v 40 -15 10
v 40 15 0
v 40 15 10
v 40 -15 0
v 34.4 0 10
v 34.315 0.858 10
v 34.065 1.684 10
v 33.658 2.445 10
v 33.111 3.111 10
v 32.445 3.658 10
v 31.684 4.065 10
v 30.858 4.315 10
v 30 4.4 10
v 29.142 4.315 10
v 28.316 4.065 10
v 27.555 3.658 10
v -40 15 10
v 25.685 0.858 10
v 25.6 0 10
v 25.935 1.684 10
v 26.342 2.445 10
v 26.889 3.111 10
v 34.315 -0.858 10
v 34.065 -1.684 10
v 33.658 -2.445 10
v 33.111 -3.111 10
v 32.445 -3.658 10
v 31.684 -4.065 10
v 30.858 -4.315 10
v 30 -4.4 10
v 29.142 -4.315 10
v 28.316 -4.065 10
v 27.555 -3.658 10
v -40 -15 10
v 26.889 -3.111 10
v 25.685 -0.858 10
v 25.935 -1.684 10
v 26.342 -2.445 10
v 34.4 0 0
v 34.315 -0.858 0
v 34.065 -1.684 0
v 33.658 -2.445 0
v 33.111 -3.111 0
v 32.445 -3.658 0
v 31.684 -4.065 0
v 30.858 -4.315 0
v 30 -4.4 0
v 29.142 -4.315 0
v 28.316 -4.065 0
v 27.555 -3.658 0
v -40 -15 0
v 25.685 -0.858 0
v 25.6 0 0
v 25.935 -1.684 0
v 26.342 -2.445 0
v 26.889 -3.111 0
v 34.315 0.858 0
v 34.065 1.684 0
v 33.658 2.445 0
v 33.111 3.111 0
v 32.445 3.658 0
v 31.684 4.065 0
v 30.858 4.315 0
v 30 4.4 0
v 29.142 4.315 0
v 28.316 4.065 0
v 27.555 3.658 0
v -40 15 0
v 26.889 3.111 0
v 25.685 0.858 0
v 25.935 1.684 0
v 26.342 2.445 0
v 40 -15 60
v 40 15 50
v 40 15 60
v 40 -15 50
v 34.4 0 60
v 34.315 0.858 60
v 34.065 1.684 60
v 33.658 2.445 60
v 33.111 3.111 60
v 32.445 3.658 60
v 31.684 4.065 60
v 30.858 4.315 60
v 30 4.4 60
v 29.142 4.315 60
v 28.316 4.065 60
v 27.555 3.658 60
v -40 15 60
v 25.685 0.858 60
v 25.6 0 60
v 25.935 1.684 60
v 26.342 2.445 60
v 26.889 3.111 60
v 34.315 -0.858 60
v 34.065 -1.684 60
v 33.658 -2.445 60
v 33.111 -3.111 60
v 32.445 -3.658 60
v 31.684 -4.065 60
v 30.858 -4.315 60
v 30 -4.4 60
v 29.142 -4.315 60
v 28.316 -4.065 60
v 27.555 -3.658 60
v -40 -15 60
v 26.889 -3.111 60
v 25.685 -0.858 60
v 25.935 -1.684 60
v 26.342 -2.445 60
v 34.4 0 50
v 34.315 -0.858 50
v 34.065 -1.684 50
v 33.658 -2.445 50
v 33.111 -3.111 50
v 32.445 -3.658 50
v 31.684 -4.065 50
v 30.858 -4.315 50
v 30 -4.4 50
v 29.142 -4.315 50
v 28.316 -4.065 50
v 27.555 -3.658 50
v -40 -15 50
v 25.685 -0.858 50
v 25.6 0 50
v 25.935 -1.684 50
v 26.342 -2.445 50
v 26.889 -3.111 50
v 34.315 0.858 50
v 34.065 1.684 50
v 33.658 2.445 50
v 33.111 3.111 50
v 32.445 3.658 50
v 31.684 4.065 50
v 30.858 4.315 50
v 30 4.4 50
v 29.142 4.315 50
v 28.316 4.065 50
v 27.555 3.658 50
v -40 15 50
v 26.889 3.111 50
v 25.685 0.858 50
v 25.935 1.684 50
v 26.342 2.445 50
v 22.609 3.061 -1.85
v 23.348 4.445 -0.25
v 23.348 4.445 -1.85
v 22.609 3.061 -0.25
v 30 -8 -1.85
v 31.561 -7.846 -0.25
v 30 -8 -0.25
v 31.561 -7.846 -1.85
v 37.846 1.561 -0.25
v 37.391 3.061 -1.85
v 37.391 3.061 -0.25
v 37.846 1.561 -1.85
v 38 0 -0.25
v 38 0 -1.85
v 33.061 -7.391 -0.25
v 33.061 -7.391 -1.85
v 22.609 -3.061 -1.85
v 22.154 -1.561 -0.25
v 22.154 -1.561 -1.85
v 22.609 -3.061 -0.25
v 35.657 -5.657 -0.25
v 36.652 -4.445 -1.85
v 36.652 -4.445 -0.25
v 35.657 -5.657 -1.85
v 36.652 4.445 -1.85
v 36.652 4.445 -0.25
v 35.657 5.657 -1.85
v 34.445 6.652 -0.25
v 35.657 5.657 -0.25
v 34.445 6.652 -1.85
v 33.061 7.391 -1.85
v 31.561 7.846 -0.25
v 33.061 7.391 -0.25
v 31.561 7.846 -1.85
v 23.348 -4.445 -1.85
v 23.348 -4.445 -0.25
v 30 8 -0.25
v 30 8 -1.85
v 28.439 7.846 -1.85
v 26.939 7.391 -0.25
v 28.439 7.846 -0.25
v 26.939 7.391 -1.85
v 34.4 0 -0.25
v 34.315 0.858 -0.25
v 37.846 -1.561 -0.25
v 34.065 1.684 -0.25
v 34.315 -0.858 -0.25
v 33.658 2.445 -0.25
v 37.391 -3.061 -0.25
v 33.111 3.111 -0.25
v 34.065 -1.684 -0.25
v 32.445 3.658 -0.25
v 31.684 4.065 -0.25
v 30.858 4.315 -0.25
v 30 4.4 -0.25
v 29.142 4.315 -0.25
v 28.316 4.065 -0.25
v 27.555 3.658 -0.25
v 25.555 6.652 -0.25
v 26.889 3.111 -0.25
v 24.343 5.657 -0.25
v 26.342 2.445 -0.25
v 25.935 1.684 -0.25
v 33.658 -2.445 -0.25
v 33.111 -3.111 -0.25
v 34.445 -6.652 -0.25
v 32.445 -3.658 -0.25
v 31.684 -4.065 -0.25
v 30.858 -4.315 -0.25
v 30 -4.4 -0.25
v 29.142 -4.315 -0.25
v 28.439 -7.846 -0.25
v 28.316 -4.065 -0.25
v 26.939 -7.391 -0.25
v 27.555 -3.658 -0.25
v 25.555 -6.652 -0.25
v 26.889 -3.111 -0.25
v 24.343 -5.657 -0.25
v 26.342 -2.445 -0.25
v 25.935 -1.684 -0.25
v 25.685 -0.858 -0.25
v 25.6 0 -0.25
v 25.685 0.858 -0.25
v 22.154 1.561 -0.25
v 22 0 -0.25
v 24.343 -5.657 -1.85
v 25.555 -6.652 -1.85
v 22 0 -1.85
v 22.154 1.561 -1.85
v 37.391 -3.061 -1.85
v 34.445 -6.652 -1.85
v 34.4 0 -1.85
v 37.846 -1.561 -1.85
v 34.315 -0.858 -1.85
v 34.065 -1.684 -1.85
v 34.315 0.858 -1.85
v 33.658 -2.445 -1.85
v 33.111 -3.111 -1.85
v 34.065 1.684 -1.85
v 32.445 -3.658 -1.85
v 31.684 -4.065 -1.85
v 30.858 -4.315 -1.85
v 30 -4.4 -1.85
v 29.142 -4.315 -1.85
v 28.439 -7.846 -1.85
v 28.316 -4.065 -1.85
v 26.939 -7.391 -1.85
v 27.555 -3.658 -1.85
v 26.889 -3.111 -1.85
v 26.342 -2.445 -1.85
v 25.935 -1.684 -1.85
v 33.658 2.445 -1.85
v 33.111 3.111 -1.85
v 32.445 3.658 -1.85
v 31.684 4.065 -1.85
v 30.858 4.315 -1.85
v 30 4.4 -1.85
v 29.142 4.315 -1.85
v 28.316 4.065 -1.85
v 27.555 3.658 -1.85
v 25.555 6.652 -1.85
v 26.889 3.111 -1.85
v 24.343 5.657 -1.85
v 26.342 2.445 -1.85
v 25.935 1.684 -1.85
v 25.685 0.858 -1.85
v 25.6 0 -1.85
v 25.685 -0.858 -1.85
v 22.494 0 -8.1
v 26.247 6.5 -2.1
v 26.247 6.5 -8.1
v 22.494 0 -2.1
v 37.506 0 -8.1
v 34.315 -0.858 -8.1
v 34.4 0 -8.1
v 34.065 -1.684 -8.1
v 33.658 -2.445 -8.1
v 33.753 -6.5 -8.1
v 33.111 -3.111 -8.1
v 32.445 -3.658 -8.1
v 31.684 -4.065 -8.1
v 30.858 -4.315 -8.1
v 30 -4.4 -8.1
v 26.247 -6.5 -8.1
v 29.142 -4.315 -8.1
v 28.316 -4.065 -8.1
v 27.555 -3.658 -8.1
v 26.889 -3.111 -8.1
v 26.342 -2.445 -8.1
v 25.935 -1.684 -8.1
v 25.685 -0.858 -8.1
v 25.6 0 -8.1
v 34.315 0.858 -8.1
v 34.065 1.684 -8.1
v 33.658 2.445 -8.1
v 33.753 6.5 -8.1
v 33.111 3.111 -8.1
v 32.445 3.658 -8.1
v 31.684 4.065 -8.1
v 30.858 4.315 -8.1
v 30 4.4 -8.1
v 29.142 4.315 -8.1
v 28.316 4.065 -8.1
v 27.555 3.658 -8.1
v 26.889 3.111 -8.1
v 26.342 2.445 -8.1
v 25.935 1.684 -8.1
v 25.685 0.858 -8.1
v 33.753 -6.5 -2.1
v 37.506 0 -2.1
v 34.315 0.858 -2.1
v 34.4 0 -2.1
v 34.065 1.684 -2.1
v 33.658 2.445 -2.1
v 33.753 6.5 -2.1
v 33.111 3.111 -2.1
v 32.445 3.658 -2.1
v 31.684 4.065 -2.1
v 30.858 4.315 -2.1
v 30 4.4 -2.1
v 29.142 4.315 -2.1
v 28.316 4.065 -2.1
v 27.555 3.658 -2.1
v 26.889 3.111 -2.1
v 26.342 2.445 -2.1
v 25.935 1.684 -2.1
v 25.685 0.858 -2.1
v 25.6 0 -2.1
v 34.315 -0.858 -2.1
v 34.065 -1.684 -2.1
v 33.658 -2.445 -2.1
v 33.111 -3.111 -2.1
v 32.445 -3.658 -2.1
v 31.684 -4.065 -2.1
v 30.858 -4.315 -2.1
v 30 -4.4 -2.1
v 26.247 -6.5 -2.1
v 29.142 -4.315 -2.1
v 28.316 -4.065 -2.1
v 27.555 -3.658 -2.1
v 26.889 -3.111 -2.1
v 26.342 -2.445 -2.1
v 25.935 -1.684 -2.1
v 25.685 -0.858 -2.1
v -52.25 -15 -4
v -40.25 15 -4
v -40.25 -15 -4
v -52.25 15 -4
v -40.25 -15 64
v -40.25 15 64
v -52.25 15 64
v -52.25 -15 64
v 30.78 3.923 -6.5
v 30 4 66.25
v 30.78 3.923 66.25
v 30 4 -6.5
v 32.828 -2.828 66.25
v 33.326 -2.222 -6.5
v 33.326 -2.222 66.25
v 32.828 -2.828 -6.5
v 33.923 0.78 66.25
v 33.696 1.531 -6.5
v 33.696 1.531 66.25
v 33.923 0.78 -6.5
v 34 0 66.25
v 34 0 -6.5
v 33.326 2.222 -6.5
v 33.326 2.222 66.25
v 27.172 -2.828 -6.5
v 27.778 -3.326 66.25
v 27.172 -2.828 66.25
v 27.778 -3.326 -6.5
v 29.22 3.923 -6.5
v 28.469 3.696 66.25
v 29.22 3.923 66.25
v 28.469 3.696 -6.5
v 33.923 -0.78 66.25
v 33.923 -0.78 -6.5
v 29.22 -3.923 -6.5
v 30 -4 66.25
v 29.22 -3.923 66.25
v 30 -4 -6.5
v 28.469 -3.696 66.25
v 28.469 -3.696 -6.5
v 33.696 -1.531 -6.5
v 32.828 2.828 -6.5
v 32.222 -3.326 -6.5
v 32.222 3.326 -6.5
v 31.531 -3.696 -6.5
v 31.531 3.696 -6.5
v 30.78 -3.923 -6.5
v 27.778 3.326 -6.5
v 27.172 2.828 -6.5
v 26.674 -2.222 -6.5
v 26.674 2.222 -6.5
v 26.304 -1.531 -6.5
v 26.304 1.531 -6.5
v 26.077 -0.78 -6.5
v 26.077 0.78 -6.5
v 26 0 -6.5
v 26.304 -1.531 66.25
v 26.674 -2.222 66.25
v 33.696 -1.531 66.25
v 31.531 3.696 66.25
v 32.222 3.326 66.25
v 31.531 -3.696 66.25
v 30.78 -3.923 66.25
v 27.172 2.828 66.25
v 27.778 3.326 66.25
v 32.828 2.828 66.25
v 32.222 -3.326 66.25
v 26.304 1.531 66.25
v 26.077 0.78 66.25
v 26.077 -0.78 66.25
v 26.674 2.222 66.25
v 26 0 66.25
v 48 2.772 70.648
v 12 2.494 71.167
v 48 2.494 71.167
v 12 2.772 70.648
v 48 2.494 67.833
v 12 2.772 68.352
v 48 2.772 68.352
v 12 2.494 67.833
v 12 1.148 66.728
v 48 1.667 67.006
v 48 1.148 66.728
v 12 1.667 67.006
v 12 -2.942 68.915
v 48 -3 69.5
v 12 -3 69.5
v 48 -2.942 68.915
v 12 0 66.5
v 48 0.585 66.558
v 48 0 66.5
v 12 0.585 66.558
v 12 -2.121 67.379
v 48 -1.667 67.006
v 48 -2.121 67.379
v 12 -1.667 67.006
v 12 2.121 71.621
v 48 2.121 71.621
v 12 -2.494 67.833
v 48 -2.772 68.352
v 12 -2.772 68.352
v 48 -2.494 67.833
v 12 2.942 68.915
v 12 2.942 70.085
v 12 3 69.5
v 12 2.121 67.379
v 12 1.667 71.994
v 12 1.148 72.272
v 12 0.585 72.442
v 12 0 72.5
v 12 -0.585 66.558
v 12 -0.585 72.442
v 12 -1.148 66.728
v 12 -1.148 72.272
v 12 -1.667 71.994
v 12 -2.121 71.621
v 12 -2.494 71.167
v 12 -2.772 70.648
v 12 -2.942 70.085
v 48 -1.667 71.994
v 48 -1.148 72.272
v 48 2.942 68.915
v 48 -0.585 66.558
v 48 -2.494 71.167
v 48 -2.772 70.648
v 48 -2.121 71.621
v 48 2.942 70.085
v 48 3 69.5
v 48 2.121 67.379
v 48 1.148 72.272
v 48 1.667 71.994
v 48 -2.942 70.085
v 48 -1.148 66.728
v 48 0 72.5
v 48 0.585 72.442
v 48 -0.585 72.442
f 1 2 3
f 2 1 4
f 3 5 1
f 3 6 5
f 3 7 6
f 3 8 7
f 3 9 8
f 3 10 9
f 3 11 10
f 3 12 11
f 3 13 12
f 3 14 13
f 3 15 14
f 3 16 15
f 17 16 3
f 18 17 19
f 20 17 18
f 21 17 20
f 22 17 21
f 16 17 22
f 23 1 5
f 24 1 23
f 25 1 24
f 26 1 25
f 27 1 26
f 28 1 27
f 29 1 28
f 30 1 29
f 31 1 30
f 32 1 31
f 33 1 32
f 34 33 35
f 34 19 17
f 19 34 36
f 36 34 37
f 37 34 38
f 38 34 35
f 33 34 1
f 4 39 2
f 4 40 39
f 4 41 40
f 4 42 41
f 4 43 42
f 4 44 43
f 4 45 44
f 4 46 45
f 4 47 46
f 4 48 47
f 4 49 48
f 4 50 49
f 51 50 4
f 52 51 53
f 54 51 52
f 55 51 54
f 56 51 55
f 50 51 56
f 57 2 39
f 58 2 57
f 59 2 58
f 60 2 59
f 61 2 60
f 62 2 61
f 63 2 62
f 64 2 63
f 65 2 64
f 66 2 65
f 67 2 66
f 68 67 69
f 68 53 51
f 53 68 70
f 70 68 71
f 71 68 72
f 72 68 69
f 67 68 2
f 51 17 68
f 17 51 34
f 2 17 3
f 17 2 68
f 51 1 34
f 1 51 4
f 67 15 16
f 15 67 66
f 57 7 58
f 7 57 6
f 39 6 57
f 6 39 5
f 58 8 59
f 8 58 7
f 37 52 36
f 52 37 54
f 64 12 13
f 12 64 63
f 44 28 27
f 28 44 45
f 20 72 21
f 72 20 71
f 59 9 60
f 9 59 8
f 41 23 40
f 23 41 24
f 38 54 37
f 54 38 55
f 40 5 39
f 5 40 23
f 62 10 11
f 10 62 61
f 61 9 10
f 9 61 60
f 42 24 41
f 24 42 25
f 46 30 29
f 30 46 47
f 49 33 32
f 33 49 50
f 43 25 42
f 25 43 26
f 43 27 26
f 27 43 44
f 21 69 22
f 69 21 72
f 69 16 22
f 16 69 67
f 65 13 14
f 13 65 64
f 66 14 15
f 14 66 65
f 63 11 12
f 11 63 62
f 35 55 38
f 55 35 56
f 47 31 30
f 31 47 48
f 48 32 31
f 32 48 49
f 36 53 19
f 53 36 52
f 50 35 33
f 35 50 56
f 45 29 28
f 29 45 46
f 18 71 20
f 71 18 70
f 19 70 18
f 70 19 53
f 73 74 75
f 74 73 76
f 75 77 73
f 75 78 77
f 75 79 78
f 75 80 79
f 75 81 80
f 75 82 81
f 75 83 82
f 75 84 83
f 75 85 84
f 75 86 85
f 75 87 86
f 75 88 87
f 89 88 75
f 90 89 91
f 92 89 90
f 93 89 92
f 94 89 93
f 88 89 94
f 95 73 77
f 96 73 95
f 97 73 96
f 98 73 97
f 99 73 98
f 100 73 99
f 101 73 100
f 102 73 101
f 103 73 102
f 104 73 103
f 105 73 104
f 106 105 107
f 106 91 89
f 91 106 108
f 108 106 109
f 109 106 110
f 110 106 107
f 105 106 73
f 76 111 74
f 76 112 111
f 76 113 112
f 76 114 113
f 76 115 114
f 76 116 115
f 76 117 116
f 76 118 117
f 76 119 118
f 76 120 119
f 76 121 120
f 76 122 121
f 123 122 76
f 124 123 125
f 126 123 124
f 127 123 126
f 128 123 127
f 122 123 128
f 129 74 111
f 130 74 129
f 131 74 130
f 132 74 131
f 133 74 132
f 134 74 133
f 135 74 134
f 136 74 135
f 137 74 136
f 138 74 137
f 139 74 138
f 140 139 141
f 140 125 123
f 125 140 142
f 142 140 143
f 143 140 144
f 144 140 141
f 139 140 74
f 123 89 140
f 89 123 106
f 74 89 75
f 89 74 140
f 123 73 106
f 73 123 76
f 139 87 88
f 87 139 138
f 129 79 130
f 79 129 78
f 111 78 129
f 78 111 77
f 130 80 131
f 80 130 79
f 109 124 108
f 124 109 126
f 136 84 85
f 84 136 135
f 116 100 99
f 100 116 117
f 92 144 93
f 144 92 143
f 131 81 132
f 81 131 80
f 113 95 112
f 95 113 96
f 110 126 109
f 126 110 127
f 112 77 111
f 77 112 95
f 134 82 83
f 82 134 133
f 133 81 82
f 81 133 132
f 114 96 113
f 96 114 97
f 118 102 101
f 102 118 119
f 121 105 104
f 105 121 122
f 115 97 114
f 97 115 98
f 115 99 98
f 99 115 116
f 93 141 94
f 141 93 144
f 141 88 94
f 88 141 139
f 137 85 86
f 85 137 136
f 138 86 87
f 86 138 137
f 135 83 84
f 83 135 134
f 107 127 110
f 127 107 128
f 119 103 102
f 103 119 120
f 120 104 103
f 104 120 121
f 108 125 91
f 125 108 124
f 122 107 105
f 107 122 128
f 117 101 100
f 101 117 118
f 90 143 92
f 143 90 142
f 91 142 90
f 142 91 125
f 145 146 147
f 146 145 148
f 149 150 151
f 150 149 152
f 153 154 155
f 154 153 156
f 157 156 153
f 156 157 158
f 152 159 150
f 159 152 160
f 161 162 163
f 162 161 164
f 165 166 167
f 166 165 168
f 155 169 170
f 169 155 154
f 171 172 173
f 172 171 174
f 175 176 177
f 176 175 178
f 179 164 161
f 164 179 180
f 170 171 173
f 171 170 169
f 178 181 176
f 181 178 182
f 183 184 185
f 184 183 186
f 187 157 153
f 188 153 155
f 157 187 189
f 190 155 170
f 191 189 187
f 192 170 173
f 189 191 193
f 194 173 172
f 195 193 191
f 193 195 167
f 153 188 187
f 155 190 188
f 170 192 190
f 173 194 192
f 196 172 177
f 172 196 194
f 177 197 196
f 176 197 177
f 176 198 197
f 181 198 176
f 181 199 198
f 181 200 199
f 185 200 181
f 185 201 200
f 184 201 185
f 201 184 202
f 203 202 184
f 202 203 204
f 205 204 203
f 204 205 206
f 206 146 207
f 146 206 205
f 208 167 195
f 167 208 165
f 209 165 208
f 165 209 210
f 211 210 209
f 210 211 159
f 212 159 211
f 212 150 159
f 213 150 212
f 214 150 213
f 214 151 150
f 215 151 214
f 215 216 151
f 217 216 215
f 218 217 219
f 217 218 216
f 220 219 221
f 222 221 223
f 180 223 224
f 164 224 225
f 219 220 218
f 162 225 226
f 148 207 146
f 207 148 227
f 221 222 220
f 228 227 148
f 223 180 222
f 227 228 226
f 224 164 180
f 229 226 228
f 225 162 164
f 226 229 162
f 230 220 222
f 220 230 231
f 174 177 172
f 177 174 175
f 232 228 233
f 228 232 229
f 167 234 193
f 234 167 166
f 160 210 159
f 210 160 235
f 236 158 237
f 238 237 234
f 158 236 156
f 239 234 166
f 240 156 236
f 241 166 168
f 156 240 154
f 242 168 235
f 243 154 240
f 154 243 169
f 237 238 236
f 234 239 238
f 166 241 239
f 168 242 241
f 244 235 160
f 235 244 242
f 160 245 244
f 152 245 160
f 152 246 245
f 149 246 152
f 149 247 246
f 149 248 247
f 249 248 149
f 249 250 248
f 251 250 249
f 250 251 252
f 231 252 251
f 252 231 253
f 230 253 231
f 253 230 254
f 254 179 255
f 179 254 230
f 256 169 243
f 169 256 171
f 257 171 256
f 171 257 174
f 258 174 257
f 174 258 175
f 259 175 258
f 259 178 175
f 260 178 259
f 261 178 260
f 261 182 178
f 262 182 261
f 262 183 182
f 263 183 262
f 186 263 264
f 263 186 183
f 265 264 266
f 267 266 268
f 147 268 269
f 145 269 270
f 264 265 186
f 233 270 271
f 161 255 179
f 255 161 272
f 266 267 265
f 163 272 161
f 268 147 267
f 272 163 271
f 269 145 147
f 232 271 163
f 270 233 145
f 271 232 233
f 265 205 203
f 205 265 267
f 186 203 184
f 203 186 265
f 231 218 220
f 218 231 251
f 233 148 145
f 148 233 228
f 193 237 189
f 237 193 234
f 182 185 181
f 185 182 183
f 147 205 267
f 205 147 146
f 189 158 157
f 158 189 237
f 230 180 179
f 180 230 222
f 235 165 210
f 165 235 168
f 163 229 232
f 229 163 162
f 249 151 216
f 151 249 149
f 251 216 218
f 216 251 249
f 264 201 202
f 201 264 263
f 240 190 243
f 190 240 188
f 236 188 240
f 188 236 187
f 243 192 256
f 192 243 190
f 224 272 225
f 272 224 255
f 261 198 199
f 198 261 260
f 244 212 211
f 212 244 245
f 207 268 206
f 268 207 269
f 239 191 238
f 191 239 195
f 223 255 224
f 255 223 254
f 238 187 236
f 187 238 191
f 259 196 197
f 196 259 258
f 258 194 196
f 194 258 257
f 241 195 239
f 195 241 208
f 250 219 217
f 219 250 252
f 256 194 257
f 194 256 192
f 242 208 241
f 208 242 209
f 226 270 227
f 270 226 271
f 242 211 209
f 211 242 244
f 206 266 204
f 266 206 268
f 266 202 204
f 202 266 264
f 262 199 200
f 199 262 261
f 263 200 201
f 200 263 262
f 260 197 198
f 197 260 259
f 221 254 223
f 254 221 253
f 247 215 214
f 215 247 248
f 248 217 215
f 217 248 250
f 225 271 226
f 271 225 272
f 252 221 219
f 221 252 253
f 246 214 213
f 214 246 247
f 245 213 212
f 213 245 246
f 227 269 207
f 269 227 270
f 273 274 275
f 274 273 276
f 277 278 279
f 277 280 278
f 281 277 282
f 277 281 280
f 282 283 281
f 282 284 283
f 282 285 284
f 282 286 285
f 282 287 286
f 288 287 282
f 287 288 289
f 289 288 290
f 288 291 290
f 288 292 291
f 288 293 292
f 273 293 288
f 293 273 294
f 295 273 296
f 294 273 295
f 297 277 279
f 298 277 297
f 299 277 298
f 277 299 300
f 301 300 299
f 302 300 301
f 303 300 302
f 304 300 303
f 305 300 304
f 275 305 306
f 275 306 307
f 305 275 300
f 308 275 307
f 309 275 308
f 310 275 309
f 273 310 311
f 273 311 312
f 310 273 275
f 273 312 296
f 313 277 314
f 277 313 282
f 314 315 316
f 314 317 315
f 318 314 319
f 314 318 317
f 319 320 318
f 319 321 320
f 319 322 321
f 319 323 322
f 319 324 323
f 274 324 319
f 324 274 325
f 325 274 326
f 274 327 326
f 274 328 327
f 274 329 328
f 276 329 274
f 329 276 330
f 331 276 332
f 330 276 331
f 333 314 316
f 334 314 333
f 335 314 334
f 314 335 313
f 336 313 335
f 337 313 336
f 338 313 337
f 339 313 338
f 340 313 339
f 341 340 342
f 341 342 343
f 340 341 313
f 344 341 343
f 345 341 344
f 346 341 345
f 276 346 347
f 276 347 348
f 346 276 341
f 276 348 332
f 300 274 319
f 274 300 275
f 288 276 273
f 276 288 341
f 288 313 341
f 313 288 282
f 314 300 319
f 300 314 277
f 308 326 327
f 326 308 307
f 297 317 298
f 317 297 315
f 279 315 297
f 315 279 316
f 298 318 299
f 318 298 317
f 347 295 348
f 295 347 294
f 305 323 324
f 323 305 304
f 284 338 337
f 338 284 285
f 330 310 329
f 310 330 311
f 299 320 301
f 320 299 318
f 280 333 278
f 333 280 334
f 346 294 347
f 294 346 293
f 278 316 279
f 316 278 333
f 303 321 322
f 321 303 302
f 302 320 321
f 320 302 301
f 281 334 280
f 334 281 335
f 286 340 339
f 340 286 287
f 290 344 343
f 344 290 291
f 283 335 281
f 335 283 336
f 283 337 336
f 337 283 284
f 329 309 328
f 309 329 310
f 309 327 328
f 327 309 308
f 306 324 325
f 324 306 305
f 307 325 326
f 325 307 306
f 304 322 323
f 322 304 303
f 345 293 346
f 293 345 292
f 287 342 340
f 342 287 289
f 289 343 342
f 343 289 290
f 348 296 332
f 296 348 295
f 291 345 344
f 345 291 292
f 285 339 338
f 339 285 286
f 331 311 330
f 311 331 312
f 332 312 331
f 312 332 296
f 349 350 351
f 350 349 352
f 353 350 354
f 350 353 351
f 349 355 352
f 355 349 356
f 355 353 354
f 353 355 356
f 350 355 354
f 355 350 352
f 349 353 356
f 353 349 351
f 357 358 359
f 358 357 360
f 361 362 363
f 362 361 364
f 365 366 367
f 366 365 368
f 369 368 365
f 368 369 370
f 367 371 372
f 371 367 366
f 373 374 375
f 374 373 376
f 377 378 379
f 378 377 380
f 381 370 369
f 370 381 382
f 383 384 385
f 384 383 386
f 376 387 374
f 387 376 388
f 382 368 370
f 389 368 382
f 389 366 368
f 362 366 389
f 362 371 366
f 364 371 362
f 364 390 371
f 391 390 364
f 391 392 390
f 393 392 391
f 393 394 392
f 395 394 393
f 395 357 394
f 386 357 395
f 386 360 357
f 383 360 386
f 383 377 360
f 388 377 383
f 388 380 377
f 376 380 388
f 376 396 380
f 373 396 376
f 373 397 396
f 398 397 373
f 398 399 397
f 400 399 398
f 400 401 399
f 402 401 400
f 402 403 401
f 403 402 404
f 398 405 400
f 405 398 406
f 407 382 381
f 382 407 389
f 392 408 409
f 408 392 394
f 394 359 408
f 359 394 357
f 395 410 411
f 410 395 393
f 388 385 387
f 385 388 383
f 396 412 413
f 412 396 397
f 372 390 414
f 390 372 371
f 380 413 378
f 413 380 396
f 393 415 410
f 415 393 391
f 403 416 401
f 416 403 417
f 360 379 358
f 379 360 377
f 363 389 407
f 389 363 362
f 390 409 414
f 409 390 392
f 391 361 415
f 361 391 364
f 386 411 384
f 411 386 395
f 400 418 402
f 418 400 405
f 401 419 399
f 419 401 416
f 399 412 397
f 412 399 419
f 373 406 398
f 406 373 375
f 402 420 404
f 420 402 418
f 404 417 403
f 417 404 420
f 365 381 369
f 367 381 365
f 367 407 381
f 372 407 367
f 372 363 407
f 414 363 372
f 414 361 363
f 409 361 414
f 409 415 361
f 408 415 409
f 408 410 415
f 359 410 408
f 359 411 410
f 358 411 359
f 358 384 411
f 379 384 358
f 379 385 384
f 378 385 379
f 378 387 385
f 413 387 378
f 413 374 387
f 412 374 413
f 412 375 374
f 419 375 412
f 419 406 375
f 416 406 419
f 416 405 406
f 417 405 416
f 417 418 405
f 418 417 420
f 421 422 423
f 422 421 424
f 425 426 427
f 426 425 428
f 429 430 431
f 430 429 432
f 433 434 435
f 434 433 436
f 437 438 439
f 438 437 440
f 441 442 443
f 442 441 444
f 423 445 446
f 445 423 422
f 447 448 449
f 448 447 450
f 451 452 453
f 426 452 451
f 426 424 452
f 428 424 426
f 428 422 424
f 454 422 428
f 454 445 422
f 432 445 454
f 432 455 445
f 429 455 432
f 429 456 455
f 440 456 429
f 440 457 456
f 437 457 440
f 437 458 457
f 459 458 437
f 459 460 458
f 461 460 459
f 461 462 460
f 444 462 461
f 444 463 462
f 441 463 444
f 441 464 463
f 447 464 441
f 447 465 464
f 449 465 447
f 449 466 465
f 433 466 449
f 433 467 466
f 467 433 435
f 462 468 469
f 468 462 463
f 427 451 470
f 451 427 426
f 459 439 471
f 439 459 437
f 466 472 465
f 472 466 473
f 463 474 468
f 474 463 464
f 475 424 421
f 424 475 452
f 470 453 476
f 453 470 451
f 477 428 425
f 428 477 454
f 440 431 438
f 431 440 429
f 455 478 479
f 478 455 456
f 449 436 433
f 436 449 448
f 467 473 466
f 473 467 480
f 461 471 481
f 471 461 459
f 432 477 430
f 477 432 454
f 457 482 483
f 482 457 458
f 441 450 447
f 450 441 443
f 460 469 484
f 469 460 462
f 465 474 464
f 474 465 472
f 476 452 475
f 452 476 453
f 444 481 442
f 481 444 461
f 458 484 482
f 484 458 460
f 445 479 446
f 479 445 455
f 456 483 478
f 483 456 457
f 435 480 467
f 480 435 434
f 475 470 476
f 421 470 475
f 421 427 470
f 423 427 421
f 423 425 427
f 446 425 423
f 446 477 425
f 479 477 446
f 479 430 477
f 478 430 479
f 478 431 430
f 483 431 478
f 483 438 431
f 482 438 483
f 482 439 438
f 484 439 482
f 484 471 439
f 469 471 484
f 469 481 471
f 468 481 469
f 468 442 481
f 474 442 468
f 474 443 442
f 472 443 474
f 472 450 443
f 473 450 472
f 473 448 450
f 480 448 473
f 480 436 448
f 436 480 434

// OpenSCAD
$fn = 32;

// ------------------------------------------------------------------------
// C clamp: throat 50 mm, screw d8
// Every part is its own module, assembly() places every instance.
// ------------------------------------------------------------------------

// --- part 1 ---
module clamp_arm() {
  difference() {
    translate([-40, -15, 0]) cube([80, 30, 10]);
    translate([30, 0, -1]) cylinder(h = 12, d = 8.8);
  }
}

// --- part 2 ---
module clamp_spine() {
  difference() {
    translate([-34, -15, 0]) cube([68, 30, 12]);
  }
}

// --- part 3 ---
module clamp_screw() {
  translate([0, 0, -36.375]) cylinder(h = 72.75, d = 8);
}

// --- part 4 ---
module clamp_washer() {
  difference() {
      translate([0, 0, 0]) cylinder(h = 1.6, d = 16);
      translate([0, 0, -1]) cylinder(h = 3.6, d = 8.8);
    }
}

// --- part 5 ---
module clamp_nut() {
  difference() {
    linear_extrude(height = 6) polygon(points = [[7.506, 0], [3.753, 6.5], [-3.753, 6.5], [-7.506, 0], [-3.753, -6.5], [3.753, -6.5]]);
    translate([0, 0, -1]) cylinder(h = 8, d = 8.8);
  }
}

// --- part 6 ---
module tommy_bar() {
  translate([0, 0, -18]) cylinder(h = 36, d = 6);
}

// --- assembly ---
module assembly() {
  color([0.80, 0.24, 0.20]) translate([0, 0, 0]) rotate([0, 0, 0]) clamp_arm();
  color([0.20, 0.45, 0.75]) translate([0, 0, 50]) rotate([0, 0, 0]) clamp_arm();
  color([0.25, 0.62, 0.32]) translate([-52.25, 0, 30]) rotate([0, 90, 0]) clamp_spine();
  color([0.92, 0.70, 0.18]) translate([30, 0, 29.875]) rotate([0, 0, 0]) clamp_screw();
  color([0.58, 0.35, 0.70]) translate([30, 0, -1.85]) rotate([0, 0, 0]) clamp_washer();
  color([0.16, 0.66, 0.66]) translate([30, 0, -8.1]) rotate([0, 0, 0]) clamp_nut();
  color([0.85, 0.48, 0.18]) translate([30, 0, 69.5]) rotate([0, 90, 0]) tommy_bar();
}

assembly();
